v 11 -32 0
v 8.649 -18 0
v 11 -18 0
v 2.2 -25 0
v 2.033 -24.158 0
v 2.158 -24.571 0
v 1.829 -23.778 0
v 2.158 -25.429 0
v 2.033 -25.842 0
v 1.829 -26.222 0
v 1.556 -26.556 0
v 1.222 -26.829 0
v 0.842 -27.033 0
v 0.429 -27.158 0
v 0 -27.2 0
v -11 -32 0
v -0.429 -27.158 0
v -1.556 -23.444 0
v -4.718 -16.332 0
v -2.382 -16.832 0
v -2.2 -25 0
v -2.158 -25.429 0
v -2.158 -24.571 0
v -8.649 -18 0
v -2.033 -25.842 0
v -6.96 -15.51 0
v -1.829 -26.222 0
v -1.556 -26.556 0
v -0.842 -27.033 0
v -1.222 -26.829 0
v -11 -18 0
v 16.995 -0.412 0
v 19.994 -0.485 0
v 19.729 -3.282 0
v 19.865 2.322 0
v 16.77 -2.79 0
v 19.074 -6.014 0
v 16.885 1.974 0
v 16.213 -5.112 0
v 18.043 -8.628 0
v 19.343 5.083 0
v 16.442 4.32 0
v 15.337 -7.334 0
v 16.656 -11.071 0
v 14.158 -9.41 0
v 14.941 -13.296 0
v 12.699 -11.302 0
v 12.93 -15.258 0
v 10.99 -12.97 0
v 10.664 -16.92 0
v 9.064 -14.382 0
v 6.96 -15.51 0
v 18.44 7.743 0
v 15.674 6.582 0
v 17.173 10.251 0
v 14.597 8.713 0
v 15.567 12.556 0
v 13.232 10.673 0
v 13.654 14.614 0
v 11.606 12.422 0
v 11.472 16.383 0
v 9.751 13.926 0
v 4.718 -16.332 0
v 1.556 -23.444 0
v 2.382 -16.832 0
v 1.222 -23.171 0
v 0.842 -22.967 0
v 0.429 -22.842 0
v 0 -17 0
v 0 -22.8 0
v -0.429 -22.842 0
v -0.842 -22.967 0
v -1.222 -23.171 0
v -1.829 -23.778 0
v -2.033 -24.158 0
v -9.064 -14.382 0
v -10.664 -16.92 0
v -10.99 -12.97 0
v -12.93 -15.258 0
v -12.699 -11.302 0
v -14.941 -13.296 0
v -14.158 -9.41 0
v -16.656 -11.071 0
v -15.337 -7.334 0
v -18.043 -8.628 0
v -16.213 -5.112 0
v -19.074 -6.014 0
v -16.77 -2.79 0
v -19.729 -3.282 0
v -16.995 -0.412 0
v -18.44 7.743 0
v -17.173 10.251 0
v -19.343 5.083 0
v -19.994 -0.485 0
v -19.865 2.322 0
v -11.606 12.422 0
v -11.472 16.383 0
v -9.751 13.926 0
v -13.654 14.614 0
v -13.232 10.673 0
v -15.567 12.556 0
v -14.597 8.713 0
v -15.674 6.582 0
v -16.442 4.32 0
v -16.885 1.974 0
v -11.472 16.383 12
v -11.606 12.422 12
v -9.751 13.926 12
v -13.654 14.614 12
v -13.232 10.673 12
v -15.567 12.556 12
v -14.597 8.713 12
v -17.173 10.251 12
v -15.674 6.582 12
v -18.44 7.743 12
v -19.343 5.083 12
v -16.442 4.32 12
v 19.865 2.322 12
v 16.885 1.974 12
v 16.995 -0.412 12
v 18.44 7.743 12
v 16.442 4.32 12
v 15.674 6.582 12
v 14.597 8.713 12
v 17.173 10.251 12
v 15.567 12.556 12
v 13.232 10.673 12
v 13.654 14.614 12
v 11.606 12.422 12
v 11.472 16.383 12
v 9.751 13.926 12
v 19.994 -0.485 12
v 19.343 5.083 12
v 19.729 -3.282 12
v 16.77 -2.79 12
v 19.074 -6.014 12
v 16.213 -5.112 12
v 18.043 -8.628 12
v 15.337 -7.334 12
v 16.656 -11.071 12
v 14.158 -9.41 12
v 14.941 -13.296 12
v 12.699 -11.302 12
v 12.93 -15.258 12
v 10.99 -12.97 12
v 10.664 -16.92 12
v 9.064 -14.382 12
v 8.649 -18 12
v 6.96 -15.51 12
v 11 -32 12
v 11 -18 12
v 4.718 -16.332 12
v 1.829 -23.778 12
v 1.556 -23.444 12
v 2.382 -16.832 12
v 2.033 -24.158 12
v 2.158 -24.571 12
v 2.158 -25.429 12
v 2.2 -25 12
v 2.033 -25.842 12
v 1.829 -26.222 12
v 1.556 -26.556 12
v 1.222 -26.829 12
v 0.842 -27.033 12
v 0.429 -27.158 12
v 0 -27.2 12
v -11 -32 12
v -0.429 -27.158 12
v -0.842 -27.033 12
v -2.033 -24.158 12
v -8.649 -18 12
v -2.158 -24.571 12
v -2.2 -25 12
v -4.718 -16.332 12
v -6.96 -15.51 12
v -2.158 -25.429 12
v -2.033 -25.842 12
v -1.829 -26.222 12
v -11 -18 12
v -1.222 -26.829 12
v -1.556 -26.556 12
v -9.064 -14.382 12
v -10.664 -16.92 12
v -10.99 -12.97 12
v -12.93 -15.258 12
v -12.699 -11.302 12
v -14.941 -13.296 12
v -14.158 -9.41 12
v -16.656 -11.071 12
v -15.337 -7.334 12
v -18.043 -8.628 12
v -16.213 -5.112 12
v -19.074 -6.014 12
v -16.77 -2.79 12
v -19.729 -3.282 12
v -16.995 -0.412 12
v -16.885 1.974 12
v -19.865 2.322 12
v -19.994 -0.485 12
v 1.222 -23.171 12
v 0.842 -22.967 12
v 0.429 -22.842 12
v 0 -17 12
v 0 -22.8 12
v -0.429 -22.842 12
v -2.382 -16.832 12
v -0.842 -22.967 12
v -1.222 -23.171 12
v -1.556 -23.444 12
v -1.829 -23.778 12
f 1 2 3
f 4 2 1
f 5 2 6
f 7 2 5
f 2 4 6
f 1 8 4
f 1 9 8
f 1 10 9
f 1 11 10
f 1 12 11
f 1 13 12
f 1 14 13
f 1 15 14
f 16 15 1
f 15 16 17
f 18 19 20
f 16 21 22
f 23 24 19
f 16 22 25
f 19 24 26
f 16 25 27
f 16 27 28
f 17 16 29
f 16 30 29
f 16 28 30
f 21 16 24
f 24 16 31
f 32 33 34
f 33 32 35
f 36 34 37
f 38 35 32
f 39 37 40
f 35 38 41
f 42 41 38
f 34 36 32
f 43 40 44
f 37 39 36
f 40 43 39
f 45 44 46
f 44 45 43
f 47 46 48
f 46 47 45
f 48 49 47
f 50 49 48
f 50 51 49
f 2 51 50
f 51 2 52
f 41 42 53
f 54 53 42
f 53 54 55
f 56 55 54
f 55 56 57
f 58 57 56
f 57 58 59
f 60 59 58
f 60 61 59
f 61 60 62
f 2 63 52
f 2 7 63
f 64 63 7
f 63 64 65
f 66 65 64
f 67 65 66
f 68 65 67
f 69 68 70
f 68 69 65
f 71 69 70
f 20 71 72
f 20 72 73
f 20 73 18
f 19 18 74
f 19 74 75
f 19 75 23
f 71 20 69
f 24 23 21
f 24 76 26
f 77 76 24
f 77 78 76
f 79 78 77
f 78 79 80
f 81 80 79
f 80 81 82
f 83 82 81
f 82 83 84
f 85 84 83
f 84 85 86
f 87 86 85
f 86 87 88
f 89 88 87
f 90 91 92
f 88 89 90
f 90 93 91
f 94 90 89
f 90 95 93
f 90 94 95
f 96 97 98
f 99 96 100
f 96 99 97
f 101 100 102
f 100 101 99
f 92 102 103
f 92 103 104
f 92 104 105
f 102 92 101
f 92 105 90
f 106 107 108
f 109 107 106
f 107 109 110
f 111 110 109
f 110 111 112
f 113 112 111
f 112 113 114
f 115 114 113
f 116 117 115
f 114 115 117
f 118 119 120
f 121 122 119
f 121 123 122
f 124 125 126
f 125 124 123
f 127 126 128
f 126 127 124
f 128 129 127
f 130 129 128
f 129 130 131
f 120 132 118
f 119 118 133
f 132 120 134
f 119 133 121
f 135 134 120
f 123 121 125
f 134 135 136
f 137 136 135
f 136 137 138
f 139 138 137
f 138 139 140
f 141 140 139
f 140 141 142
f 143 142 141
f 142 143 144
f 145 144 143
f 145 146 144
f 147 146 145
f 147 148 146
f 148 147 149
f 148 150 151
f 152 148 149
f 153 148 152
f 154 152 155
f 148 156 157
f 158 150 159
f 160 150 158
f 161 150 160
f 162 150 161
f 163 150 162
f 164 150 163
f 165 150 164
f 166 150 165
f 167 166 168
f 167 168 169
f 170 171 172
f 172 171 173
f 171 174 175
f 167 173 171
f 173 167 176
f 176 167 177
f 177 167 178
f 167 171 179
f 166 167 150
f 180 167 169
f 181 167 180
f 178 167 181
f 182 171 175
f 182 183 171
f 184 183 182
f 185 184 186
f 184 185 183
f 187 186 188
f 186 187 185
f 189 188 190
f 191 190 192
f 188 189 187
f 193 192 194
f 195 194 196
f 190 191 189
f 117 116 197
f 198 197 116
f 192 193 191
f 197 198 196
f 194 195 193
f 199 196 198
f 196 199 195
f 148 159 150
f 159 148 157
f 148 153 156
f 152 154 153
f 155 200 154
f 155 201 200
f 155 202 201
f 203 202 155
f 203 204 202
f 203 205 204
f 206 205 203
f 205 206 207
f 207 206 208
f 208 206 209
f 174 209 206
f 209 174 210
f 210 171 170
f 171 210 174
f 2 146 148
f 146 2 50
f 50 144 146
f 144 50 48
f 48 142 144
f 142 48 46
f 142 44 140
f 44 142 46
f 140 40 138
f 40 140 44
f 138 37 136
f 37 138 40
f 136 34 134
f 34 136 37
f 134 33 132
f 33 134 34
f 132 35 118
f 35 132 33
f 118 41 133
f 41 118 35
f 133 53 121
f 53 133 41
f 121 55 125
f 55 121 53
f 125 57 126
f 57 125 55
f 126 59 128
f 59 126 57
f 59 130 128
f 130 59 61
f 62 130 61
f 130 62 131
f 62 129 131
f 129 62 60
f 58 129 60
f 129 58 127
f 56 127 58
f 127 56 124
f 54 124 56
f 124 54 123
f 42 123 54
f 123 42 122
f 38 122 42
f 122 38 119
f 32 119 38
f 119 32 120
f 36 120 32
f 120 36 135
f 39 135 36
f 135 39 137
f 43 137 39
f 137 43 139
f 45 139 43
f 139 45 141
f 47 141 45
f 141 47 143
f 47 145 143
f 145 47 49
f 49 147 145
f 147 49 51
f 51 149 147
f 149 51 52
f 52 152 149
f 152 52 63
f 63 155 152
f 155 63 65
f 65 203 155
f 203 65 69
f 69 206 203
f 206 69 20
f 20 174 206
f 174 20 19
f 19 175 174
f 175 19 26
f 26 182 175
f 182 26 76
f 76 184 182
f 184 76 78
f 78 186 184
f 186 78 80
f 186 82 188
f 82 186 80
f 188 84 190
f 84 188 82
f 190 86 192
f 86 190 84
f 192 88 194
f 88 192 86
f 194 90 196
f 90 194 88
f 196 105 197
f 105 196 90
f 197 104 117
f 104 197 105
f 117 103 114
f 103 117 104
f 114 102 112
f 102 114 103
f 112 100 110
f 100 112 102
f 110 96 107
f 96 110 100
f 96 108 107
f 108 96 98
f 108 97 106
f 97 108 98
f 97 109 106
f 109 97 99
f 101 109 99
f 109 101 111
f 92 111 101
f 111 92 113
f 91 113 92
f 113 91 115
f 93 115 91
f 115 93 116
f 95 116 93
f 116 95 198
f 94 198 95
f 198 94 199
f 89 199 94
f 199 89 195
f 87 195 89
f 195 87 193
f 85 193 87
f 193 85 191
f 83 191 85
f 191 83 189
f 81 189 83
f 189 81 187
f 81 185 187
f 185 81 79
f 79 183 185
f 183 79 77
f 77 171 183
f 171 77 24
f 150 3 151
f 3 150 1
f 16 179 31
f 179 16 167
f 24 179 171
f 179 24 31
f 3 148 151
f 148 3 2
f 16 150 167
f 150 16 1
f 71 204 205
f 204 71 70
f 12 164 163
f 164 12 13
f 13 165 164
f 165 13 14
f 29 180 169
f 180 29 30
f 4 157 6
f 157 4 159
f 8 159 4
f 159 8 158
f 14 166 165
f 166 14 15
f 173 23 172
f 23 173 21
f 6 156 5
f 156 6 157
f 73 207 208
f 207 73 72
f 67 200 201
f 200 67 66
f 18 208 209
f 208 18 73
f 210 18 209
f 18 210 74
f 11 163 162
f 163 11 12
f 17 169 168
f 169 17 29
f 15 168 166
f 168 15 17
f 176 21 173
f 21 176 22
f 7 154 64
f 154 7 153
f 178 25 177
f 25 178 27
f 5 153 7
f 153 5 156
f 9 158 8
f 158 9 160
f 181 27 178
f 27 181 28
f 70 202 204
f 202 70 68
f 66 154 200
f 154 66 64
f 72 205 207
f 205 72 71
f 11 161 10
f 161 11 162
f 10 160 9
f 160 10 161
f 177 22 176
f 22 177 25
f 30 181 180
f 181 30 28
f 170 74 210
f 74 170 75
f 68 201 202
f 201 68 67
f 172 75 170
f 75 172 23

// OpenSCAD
$fn = 32;

// ----------------------------------------------------------------------
// Spring clip: 40 mm outside, 3 mm band, 70 degree opening
// ----------------------------------------------------------------------

// --- parameters (mm) ---
outer_r = 20;             // clip outside radius
inner_r = 17;             // clip bore radius
band = 3;                 // band thickness
clip_w = 12;              // clip width
opening = 70;             // opening angle
tab_w = 22;               // tab width
tab_len = 12;             // tab length past the clip
tab_hole = 4.4;           // tab fixing hole

clip_profile = [[-11.472, 16.383], [-13.654, 14.614], [-15.567, 12.556], [-17.173, 10.251], [-18.44, 7.743], [-19.343, 5.083], [-19.865, 2.322], [-19.994, -0.485], [-19.729, -3.282], [-19.074, -6.014], [-18.043, -8.628], [-16.656, -11.071], [-14.941, -13.296], [-12.93, -15.258], [-10.664, -16.92], [-8.188, -18.247], [-5.55, -19.215], [-2.803, -19.803], [0, -20], [2.803, -19.803], [5.55, -19.215], [8.188, -18.247], [10.664, -16.92], [12.93, -15.258], [14.941, -13.296], [16.656, -11.071], [18.043, -8.628], [19.074, -6.014], [19.729, -3.282], [19.994, -0.485], [19.865, 2.322], [19.343, 5.083], [18.44, 7.743], [17.173, 10.251], [15.567, 12.556], [13.654, 14.614], [11.472, 16.383], [9.751, 13.926], [11.606, 12.422], [13.232, 10.673], [14.597, 8.713], [15.674, 6.582], [16.442, 4.32], [16.885, 1.974], [16.995, -0.412], [16.77, -2.79], [16.213, -5.112], [15.337, -7.334], [14.158, -9.41], [12.699, -11.302], [10.99, -12.97], [9.064, -14.382], [6.96, -15.51], [4.718, -16.332], [2.382, -16.832], [0, -17], [-2.382, -16.832], [-4.718, -16.332], [-6.96, -15.51], [-9.064, -14.382], [-10.99, -12.97], [-12.699, -11.302], [-14.158, -9.41], [-15.337, -7.334], [-16.213, -5.112], [-16.77, -2.79], [-16.995, -0.412], [-16.885, 1.974], [-16.442, 4.32], [-15.674, 6.582], [-14.597, 8.713], [-13.232, 10.673], [-11.606, 12.422], [-9.751, 13.926]];

difference() {
  union() {
    linear_extrude(height = clip_w) polygon(clip_profile);
    /* mounting tab, sunk 2 mm into the band */
    translate([-11, -32, 0]) cube([tab_w, 14, clip_w]);
  }
  translate([0, -25, -2.5]) cylinder(h = clip_w + 5, d = tab_hole);
}
